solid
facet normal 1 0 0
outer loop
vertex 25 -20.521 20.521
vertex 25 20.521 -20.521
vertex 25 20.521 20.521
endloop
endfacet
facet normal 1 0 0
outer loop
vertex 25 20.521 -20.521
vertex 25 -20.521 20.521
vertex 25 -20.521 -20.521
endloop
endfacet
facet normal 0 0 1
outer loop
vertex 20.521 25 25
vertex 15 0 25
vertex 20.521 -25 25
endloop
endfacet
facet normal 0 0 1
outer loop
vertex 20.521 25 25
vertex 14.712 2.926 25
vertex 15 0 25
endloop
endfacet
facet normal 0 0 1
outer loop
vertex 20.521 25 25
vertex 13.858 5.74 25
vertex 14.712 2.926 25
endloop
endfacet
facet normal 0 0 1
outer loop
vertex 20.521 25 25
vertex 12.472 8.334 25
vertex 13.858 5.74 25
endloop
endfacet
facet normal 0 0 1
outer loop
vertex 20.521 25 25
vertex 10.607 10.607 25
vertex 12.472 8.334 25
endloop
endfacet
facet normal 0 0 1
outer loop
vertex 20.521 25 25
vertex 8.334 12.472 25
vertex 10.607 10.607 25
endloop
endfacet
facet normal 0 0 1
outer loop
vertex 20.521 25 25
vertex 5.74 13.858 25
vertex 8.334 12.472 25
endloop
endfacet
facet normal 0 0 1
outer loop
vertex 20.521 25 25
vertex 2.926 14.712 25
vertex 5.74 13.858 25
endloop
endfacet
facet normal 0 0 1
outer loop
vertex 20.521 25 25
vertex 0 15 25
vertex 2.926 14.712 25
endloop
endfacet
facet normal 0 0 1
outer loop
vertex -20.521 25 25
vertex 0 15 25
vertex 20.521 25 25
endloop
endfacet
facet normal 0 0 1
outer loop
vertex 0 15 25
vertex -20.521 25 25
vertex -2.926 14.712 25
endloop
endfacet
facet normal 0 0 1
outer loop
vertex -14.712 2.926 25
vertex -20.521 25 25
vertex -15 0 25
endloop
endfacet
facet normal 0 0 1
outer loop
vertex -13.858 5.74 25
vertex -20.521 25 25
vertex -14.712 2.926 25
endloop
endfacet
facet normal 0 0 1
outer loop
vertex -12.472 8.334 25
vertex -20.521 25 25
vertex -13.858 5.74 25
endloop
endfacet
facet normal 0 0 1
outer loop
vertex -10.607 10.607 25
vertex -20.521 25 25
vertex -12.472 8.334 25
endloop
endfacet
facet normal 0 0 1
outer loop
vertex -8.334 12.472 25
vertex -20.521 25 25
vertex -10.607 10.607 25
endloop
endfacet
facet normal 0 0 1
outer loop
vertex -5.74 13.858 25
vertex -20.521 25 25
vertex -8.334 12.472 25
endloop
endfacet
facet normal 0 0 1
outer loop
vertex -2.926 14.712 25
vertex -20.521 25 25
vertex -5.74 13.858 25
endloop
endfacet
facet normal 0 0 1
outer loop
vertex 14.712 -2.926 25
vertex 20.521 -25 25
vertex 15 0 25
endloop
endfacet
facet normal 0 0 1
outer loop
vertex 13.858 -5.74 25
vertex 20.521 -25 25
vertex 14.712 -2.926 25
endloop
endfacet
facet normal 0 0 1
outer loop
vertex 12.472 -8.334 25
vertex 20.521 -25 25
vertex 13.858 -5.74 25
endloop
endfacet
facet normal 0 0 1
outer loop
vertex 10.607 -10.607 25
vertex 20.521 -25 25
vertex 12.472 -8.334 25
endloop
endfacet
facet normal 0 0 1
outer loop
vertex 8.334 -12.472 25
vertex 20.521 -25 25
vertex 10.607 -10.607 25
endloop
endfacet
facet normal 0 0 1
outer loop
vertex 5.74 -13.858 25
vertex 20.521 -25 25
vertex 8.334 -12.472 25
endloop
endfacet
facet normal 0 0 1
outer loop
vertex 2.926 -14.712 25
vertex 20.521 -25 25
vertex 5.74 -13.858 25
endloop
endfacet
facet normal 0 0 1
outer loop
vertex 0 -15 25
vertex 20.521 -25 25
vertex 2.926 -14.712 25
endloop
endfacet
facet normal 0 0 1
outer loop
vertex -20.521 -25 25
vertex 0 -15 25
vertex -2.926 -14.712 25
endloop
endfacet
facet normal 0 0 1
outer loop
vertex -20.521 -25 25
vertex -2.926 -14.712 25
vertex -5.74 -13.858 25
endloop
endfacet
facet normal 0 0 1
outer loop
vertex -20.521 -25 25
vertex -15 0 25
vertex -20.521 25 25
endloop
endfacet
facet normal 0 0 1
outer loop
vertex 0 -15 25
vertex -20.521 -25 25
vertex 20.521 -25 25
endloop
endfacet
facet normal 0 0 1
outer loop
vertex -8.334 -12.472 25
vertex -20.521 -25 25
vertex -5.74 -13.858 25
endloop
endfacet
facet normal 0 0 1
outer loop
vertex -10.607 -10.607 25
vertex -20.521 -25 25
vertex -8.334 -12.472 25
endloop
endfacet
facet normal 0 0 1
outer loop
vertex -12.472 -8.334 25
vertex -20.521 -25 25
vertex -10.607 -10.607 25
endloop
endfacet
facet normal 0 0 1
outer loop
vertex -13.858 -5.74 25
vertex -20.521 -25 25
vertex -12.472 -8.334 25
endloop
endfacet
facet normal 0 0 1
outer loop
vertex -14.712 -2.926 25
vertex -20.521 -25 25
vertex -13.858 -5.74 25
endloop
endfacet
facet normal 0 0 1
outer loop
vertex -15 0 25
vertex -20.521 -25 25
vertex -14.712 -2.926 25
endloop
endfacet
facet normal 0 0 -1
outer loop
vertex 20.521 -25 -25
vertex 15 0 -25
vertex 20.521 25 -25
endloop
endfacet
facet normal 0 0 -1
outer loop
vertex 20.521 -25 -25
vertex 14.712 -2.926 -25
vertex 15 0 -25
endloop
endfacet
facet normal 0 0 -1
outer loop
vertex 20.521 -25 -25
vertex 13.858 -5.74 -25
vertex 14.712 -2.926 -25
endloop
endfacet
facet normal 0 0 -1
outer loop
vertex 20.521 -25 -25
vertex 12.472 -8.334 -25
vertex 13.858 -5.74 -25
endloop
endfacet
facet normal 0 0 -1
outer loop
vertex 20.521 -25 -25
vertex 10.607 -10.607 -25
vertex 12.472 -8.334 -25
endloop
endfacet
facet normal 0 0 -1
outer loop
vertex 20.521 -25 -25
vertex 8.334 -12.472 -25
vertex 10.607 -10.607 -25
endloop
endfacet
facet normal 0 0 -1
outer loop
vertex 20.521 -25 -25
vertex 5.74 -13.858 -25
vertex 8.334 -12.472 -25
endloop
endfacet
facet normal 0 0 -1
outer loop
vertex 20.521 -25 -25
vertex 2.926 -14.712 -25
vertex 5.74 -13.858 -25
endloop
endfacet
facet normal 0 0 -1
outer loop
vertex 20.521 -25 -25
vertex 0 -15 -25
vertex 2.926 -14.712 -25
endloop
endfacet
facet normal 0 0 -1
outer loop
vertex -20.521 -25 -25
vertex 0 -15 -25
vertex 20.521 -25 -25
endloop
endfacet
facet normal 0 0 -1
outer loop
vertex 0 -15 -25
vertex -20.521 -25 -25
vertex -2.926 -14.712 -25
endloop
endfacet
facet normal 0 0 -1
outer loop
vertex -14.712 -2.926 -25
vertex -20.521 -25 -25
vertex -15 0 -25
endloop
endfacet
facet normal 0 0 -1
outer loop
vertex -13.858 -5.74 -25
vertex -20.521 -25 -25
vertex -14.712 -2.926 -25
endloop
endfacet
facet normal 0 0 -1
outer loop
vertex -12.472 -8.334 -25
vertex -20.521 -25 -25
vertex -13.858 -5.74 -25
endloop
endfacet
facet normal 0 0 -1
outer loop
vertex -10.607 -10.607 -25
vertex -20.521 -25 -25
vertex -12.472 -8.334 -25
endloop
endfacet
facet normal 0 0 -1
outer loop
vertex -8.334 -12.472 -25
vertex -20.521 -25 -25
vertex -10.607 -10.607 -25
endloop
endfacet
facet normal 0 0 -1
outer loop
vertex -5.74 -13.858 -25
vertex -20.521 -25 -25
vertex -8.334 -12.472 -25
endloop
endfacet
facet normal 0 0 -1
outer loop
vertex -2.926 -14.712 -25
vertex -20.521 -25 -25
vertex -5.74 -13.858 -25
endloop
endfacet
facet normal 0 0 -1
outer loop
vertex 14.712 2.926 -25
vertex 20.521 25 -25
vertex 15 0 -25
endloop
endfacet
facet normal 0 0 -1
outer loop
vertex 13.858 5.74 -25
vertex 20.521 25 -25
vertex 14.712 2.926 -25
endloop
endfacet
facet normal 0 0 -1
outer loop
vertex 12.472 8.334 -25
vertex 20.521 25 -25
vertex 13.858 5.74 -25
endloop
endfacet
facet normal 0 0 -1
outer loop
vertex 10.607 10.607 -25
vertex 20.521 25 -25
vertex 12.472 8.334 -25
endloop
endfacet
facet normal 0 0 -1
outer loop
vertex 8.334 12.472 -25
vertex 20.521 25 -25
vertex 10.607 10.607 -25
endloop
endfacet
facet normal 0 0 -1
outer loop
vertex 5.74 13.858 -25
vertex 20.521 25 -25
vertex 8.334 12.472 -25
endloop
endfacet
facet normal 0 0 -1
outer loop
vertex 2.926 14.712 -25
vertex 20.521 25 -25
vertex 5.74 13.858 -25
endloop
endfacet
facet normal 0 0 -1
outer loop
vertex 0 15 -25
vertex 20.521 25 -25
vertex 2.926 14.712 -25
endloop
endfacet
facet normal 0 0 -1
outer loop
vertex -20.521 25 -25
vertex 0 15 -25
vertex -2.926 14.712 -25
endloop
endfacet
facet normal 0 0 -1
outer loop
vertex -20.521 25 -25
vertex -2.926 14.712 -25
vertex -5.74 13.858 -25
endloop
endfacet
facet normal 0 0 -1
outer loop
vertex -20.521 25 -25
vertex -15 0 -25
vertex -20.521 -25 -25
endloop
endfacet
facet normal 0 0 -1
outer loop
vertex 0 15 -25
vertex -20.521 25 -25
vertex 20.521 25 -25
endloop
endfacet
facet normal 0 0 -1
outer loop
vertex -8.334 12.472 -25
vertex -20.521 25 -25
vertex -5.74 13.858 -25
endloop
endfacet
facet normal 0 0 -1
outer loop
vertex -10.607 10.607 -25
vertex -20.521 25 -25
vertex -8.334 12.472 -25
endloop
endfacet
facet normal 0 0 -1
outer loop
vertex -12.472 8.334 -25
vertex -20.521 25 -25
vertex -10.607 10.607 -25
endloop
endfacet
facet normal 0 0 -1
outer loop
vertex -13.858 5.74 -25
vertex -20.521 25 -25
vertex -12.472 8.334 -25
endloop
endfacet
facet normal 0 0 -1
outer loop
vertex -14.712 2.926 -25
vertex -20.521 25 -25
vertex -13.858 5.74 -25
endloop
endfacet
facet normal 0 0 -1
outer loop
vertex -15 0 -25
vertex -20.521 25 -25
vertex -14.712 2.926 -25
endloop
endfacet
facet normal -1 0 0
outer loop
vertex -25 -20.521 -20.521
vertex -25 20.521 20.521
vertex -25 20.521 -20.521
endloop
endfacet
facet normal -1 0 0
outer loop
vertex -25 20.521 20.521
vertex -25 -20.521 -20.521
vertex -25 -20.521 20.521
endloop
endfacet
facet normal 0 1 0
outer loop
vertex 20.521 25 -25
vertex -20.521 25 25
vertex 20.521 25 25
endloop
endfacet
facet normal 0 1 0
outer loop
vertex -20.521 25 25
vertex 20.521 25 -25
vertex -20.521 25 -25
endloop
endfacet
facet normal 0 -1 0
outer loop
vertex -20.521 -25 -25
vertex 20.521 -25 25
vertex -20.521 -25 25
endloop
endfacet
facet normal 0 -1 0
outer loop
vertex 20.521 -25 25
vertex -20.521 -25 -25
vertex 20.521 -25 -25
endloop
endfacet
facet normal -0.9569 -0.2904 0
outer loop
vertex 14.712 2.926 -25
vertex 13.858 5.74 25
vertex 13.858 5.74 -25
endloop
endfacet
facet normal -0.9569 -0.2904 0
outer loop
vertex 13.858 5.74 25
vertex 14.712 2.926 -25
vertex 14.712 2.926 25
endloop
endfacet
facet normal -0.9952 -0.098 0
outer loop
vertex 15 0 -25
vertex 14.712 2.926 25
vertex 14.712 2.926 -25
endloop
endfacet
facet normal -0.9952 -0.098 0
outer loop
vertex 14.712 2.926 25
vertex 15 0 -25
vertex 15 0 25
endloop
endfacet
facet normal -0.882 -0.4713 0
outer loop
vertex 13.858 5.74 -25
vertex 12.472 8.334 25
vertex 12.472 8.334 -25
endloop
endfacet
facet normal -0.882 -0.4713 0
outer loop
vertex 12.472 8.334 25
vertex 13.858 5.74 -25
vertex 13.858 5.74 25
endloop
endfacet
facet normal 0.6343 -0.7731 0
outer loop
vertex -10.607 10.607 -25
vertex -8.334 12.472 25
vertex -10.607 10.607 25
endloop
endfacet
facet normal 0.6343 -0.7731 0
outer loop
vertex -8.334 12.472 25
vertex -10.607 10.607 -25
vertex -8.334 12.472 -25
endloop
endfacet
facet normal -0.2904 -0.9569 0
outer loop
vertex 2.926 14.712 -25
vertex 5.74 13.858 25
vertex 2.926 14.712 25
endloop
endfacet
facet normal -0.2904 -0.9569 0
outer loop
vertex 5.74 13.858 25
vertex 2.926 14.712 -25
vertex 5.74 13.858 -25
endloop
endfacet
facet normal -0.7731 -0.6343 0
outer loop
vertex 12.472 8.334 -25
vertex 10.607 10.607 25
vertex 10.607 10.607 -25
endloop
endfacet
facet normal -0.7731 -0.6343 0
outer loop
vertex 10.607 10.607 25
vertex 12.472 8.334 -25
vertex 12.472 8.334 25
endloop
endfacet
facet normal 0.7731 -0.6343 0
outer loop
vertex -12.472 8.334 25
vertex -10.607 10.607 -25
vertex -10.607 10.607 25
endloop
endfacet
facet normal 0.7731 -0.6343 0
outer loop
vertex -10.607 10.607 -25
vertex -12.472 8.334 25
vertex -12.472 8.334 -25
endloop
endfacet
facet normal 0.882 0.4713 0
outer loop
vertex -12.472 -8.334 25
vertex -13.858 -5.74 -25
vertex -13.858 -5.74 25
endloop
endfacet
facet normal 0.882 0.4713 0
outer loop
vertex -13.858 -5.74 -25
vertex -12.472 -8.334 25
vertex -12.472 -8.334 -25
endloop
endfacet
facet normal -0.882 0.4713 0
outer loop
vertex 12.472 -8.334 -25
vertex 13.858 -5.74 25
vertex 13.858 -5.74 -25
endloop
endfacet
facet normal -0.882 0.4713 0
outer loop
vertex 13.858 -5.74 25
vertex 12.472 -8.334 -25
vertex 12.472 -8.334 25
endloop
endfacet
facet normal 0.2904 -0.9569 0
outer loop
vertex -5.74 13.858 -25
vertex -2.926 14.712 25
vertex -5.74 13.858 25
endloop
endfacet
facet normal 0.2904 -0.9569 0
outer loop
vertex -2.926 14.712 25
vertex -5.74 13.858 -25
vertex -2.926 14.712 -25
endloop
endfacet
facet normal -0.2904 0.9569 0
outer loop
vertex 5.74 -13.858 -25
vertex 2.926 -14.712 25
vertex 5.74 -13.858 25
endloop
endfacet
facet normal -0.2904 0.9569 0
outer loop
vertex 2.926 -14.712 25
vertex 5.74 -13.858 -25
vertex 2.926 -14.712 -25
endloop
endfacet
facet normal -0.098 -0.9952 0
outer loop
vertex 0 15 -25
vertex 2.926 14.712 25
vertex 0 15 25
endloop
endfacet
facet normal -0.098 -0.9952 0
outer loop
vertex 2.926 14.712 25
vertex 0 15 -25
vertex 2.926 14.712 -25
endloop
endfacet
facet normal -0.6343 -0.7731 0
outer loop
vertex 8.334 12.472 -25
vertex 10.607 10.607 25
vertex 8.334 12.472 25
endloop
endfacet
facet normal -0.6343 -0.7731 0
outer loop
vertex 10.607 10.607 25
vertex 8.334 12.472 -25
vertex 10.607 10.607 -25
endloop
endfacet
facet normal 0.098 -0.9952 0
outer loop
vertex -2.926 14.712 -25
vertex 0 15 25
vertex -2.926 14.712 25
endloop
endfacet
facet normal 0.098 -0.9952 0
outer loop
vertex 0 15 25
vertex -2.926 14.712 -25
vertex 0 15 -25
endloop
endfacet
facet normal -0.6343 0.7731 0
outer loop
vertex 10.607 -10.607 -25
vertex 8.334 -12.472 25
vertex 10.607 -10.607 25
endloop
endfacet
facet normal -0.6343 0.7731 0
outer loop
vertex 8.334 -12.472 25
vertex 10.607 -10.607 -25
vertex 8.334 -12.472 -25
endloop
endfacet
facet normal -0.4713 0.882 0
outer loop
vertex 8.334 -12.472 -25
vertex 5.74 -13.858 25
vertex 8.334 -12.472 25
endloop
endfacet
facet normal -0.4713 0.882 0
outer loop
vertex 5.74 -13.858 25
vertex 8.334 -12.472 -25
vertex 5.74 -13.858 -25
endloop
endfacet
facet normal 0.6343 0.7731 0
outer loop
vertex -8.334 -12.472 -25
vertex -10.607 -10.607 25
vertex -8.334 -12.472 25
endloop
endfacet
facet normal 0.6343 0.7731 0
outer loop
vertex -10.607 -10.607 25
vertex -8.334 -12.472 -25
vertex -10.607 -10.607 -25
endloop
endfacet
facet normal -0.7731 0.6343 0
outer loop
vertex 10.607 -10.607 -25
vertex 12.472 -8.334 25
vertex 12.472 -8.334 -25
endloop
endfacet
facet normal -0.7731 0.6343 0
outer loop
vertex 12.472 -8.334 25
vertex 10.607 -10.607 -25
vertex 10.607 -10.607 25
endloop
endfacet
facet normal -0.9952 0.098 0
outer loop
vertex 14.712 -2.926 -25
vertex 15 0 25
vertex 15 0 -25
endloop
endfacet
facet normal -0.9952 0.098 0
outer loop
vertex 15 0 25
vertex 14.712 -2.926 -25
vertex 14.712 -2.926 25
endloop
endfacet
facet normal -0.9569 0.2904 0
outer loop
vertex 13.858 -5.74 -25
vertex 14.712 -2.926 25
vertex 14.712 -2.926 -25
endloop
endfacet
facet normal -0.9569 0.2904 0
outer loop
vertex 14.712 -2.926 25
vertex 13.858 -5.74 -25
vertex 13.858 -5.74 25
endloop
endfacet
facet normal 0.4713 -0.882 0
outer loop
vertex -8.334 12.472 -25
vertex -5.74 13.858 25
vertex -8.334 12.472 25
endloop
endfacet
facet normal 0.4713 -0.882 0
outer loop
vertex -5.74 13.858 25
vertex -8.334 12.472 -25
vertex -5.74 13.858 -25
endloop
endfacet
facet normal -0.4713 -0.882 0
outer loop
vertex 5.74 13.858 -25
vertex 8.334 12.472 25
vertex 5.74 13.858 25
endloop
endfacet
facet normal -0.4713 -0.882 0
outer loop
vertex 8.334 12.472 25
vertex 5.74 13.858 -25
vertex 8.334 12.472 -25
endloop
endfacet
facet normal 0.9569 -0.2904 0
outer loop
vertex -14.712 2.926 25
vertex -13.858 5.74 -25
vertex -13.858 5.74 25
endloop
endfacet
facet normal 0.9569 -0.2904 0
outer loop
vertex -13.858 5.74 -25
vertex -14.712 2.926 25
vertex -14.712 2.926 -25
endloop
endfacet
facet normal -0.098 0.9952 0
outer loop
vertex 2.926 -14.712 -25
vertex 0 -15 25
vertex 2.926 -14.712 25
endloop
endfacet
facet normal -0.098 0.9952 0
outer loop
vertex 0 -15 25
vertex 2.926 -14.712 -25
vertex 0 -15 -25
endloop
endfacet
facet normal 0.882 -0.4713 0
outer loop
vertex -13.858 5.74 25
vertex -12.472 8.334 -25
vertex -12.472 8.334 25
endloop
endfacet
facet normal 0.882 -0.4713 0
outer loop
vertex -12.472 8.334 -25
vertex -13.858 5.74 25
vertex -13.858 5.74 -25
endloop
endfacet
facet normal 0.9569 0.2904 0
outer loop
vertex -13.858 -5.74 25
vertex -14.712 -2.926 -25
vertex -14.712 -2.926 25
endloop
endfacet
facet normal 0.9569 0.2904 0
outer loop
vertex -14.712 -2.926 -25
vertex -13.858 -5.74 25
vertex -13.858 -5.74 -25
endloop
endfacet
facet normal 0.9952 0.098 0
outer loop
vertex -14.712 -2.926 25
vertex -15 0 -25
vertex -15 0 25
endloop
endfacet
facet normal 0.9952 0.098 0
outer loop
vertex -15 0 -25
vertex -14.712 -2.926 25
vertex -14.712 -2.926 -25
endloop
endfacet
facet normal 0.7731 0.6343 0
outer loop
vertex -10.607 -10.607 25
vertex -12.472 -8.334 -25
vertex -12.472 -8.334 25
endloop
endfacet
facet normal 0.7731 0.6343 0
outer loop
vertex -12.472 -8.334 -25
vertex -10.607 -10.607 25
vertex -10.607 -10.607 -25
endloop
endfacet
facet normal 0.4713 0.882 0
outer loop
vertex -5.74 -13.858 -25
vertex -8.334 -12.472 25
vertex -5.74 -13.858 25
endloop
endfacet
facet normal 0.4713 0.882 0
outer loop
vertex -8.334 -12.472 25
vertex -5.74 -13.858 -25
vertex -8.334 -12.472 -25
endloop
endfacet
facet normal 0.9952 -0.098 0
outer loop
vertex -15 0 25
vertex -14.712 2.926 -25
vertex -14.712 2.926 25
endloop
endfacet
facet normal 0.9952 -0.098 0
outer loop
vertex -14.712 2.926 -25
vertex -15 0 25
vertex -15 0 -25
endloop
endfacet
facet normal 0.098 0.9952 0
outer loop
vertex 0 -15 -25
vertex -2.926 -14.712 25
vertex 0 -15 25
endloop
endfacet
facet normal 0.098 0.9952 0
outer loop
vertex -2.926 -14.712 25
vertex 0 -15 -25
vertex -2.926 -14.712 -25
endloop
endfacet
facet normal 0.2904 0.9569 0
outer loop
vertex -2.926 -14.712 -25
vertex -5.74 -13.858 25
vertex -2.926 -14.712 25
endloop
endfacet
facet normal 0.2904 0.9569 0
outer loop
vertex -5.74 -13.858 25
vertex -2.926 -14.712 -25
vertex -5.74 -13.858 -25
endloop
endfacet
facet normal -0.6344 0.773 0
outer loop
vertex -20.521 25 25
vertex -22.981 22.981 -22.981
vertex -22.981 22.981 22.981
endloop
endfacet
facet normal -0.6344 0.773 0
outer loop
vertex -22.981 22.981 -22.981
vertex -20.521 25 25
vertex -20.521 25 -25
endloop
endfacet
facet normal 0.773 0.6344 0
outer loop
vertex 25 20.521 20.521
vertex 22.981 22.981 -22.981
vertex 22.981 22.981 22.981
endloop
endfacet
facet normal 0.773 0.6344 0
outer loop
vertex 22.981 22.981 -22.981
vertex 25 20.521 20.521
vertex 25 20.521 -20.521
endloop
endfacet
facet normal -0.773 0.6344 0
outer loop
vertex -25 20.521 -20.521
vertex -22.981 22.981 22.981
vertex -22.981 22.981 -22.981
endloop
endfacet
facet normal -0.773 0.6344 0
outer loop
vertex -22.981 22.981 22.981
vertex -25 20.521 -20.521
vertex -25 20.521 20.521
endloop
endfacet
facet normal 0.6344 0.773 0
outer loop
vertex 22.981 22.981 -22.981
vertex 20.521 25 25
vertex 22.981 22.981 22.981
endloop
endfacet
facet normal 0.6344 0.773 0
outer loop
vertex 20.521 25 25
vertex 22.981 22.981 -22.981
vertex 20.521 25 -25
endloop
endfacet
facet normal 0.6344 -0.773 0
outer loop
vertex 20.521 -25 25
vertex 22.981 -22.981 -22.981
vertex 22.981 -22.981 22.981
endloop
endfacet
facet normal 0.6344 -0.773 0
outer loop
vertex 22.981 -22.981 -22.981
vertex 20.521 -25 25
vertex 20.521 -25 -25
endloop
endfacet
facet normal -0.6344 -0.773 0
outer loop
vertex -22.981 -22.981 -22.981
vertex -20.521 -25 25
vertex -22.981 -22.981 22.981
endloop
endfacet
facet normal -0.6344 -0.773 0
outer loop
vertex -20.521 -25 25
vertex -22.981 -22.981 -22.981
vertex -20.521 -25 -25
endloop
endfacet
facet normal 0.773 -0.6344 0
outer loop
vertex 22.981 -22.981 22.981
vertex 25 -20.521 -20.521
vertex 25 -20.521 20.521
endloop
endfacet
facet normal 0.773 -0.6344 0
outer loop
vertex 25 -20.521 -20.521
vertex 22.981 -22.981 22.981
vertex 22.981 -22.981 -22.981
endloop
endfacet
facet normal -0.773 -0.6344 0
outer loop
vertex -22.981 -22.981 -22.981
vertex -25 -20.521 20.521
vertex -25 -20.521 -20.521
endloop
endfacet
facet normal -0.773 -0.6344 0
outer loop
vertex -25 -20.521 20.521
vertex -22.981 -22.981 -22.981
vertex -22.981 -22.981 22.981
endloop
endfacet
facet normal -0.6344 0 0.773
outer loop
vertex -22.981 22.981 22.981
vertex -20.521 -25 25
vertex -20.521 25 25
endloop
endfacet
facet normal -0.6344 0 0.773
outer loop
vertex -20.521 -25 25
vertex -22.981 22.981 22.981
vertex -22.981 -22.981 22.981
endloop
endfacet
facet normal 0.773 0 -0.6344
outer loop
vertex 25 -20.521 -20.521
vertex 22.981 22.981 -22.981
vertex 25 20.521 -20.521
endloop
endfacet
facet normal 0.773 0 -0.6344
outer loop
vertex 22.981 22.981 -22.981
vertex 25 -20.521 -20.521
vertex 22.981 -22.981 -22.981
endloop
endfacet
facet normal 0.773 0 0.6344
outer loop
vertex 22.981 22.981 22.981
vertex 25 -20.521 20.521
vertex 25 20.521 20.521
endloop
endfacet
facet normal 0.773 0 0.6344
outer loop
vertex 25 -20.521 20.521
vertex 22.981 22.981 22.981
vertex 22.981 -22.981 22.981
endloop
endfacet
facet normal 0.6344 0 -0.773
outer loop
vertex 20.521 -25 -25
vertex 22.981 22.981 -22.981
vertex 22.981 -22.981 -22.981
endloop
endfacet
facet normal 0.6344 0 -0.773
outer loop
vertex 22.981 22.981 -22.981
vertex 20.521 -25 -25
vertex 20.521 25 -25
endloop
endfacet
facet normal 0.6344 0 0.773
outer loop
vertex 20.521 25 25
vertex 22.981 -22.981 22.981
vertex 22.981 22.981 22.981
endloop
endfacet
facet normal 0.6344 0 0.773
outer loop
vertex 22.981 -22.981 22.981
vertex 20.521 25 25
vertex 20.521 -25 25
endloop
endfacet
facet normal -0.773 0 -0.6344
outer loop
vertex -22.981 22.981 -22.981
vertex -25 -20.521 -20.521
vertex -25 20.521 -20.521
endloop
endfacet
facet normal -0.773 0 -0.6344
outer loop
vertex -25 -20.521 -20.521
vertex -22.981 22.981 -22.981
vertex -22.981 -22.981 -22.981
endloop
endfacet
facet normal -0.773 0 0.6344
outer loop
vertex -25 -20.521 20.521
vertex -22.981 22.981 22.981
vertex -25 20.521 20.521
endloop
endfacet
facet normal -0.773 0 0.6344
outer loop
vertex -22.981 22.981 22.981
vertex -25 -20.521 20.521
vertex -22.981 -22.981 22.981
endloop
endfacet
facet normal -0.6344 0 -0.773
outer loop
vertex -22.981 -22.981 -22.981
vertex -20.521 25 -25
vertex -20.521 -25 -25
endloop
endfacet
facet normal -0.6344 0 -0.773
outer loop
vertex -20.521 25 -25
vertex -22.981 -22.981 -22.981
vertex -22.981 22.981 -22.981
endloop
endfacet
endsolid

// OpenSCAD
$fn=32;

intersection(){
    difference(){
        cube(size=50, center=true);
        cylinder(d=30,h=80, center=true);
    }
    cylinder(d=65,h=80,center=true);
    rotate([90,0,0]) cylinder(d=65,h=80,center=true);
}
